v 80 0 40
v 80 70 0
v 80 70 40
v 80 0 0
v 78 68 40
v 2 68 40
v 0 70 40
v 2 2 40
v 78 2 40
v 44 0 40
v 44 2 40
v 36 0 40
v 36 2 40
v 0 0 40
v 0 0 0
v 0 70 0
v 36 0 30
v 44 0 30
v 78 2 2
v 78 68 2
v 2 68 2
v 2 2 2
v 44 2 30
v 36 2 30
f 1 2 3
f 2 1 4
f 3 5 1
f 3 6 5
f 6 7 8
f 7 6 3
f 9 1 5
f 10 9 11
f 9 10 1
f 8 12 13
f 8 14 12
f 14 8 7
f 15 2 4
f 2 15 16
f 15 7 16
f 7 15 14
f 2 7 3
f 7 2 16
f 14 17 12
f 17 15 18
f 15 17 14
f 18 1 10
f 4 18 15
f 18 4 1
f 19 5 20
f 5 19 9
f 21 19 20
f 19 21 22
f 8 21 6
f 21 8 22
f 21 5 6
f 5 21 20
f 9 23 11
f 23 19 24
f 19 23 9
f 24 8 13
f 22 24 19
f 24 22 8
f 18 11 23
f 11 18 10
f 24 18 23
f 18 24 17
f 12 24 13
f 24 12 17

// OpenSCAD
$fn = 32;

// ----------------------------------------------------------------------
// Enclosure box: notch enclosure
// ----------------------------------------------------------------------

// --- parameters (mm) ---
box_l = 80;               // outer length, X
box_w = 70;               // outer width, Y
box_h = 40;               // outer height
wall_t = 2;               // wall thickness
notch_w = 8;              // cable notch width
notch_h = 10;             // cable notch height

inner_h = box_h - wall_t;  // cavity depth
boss_h = inner_h - 2;  // corner boss height

difference() {
  cube([box_l, box_w, box_h]);
  translate([wall_t, wall_t, wall_t])
    cube([box_l - 2 * wall_t, box_w - 2 * wall_t, box_h]);
  translate([box_l / 2 - notch_w / 2, -1, box_h - notch_h])
    cube([notch_w, wall_t + 2, notch_h + 1]);
}
